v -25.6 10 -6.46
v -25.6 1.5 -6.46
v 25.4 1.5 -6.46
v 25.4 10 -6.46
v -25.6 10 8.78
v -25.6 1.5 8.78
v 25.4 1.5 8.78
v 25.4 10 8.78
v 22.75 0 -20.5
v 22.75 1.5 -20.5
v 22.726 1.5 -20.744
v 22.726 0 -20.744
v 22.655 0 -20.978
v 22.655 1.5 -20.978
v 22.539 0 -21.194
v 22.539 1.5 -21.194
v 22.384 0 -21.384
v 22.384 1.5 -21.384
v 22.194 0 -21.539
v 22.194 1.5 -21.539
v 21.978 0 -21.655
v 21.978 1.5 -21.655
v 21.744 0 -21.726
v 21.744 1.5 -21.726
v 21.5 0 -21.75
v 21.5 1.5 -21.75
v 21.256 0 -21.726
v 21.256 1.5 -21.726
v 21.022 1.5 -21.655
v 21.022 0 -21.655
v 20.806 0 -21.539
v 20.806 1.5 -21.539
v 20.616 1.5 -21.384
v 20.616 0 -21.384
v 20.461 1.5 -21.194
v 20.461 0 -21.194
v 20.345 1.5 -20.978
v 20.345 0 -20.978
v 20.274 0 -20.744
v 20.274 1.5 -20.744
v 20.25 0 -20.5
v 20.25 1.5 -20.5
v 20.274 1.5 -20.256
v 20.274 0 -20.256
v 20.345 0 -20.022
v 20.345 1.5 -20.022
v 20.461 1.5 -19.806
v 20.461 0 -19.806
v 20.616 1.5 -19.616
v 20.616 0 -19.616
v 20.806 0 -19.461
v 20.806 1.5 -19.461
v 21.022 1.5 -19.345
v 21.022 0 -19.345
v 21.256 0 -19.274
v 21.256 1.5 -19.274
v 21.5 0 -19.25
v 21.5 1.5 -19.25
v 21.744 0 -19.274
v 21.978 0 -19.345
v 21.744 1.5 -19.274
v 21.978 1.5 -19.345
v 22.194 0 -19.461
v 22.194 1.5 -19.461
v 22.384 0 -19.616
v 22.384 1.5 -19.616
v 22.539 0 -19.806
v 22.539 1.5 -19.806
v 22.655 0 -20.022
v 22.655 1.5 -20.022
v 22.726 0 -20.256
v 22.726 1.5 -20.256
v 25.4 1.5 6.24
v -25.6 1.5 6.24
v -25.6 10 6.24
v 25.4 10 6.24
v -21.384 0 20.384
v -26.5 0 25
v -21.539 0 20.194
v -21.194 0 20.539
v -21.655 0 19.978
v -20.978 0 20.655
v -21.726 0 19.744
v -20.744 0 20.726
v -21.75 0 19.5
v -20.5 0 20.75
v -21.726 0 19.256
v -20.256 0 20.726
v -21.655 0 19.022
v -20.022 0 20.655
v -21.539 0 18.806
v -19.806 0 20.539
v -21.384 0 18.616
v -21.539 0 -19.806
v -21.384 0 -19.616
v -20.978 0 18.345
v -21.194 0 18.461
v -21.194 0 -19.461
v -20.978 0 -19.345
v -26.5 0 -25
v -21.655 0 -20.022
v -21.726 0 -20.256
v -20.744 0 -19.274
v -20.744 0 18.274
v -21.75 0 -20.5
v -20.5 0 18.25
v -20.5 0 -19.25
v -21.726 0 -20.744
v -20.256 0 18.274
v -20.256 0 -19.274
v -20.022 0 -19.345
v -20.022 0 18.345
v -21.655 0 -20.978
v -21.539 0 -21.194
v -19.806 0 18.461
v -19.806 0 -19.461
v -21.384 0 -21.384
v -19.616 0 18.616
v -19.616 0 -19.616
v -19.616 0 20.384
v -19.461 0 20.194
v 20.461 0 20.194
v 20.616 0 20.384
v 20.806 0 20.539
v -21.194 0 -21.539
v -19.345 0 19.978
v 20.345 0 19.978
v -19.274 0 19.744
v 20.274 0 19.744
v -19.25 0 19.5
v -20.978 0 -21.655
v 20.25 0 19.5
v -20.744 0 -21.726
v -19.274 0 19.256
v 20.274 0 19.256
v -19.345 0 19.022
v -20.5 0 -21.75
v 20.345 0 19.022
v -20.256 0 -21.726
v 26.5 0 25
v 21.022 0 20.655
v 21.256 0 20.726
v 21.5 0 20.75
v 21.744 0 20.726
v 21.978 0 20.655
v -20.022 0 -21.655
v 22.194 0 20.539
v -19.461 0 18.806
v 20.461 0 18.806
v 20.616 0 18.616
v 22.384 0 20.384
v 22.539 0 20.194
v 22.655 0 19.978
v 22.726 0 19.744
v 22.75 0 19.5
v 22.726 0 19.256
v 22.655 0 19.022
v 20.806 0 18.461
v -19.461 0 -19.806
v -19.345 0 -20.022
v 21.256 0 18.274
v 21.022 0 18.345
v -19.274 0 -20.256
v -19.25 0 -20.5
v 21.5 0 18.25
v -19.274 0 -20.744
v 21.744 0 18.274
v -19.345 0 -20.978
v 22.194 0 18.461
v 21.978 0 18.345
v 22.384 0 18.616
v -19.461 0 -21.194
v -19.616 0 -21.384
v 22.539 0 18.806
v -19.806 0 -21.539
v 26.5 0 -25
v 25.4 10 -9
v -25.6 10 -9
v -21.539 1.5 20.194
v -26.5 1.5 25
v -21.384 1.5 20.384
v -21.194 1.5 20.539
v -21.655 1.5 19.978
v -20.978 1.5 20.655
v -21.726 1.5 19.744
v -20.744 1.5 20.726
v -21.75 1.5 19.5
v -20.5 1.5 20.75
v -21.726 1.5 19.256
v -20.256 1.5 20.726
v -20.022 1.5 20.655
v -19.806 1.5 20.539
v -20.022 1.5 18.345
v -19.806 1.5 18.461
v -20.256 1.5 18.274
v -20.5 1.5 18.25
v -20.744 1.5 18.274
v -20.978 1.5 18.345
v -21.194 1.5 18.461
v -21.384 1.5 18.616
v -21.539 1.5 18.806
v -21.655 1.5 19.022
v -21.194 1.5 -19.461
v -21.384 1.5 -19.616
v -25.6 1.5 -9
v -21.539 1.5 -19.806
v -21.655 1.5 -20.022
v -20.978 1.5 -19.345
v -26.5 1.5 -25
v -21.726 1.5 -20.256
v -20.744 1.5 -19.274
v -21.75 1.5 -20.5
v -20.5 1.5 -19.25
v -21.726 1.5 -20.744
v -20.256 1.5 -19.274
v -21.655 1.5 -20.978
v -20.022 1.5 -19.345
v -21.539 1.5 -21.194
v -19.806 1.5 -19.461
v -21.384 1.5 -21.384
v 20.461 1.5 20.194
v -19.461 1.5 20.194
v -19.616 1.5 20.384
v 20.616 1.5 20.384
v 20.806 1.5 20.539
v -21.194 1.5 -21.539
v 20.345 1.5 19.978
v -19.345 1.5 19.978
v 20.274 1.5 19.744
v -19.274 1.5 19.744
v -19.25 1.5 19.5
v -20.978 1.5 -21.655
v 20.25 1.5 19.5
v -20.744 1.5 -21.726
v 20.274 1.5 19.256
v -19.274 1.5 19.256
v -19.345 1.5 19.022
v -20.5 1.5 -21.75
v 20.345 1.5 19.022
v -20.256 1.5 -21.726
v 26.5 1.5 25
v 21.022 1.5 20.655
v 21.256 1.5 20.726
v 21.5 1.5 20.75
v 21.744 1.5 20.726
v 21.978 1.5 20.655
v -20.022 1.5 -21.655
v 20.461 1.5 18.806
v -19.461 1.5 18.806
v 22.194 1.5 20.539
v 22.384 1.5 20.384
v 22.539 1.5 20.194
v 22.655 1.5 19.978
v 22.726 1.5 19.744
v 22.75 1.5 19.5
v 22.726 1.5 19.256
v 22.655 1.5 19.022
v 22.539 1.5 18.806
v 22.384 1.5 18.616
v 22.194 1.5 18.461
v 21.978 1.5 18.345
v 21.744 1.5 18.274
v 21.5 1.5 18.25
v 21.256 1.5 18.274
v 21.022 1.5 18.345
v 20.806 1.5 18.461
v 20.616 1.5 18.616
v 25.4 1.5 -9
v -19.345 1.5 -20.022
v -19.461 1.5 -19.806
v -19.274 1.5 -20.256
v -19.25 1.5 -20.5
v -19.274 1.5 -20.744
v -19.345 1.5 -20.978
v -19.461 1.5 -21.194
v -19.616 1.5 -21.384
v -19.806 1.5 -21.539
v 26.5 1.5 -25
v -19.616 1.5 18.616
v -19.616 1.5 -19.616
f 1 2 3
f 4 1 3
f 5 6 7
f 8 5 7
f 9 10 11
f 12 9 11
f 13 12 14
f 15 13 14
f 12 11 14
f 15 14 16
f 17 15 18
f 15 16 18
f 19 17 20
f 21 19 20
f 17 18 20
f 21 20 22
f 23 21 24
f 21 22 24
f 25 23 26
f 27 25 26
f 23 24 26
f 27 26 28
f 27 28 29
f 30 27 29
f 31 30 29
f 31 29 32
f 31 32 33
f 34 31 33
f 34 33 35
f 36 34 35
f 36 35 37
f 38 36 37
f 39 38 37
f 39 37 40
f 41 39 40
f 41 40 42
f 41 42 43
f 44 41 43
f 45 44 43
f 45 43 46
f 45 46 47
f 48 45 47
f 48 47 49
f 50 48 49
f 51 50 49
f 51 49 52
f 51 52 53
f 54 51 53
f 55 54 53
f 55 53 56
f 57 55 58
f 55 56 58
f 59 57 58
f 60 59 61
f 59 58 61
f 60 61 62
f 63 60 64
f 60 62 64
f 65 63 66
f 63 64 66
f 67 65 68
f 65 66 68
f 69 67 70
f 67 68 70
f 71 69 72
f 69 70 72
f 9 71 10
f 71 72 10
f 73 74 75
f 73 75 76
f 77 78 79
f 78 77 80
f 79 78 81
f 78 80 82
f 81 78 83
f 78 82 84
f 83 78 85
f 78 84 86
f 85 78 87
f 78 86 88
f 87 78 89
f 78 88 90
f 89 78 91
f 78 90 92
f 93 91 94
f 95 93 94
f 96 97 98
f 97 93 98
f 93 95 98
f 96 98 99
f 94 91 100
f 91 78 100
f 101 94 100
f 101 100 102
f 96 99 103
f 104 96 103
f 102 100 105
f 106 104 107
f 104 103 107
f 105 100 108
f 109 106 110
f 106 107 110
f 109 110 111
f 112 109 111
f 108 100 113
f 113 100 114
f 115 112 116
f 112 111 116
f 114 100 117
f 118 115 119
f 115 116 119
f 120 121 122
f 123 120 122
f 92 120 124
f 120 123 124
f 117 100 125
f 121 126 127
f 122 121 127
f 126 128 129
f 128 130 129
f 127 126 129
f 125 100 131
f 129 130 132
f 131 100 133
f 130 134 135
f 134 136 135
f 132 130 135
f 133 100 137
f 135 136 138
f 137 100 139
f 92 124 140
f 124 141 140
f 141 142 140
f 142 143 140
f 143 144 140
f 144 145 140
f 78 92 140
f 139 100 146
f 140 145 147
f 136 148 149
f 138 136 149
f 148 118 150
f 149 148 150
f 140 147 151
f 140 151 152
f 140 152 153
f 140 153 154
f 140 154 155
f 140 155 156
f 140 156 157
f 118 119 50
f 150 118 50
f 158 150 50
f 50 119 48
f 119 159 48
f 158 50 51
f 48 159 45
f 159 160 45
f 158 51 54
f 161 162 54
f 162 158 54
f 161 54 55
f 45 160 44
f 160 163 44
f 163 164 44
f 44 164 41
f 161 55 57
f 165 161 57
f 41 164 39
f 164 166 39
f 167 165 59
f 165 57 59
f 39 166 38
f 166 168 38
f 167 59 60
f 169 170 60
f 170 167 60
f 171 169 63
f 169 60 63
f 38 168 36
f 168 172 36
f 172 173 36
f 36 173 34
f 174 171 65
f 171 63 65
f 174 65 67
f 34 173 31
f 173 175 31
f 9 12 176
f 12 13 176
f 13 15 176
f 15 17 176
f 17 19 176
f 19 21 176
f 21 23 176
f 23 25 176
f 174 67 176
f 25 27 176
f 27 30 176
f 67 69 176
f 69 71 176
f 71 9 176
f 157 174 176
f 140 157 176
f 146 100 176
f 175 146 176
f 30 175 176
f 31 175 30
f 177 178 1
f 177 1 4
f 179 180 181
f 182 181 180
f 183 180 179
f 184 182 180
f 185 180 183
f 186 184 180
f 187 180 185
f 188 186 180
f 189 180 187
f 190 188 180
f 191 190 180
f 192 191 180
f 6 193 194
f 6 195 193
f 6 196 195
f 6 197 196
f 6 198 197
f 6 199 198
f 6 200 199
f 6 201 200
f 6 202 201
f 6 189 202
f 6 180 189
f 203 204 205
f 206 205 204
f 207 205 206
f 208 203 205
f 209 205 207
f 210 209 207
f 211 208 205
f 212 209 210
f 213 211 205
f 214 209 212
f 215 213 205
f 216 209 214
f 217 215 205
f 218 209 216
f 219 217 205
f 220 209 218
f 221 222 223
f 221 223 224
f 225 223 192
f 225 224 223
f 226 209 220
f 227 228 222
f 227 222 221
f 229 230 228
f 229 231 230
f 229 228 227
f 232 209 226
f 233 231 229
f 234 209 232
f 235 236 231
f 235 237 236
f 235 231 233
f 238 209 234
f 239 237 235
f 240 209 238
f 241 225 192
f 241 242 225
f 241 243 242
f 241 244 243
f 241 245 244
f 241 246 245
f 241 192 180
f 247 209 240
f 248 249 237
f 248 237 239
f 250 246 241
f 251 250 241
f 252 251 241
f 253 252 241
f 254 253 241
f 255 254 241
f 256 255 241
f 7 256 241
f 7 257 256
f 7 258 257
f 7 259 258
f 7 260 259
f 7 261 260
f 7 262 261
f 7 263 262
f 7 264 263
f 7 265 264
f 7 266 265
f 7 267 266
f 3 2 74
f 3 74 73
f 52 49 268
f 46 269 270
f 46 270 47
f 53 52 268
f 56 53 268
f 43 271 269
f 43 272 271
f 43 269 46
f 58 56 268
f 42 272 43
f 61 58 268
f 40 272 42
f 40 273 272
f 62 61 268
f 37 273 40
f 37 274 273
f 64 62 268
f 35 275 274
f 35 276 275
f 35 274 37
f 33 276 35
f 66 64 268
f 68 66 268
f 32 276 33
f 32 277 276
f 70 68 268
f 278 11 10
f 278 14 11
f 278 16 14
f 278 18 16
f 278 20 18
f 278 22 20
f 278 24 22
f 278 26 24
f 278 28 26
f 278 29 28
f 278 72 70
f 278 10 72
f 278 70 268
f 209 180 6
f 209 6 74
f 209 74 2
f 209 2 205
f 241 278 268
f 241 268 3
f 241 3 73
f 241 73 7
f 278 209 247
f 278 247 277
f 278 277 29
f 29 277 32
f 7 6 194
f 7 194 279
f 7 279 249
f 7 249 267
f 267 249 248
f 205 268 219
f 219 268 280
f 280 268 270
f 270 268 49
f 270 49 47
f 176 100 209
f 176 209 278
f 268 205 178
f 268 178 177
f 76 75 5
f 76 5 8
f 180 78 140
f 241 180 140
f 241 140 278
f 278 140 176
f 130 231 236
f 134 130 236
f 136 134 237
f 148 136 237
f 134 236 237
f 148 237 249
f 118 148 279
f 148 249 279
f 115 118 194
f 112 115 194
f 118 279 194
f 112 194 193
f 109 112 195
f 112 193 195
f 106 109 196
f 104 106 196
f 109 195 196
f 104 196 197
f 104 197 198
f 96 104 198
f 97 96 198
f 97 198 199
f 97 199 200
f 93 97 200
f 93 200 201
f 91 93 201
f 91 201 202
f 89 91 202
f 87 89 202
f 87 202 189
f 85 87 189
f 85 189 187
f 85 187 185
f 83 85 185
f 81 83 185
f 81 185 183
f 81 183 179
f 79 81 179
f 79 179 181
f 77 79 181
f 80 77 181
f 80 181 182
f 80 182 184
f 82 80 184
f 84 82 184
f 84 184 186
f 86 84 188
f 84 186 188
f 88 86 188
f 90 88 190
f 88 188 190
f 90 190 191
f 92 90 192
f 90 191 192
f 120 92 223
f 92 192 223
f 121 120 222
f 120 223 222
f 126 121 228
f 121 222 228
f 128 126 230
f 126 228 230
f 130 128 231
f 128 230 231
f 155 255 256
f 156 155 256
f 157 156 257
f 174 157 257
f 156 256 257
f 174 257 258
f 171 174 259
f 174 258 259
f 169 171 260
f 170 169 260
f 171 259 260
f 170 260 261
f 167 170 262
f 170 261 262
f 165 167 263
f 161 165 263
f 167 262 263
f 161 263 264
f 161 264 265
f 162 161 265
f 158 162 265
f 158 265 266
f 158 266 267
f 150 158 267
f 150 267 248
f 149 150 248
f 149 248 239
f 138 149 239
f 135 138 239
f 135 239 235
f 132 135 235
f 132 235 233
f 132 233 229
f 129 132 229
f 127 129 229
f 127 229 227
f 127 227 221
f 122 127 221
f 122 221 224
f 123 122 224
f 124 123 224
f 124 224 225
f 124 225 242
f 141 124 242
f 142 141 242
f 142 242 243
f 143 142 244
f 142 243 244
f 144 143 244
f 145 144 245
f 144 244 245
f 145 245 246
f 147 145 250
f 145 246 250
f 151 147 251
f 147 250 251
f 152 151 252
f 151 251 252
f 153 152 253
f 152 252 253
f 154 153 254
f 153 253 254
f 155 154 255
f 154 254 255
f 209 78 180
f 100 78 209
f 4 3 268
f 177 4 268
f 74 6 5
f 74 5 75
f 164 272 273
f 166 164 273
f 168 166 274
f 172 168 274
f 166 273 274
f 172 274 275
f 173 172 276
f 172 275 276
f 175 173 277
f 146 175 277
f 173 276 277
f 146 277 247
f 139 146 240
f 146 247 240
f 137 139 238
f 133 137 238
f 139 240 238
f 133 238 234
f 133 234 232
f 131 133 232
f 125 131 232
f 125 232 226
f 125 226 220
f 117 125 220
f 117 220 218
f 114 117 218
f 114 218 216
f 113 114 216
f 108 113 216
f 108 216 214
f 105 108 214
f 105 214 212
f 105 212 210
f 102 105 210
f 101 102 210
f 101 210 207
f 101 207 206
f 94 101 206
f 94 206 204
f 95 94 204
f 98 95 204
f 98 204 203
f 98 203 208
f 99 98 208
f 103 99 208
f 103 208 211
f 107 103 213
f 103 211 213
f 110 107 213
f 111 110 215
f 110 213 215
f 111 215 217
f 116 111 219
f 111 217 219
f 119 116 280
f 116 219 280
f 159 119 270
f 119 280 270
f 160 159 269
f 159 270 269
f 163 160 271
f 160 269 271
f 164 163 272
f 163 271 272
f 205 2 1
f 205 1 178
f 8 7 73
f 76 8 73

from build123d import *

# Parameters (mm, degrees)
SCHIZZO1_W                   = 53
SCHIZZO1_H                   = 50
ESTRUSIONE_ESTRUSIONE1_DEPTH = 1.5
SCHIZZO2_W                   = 51
SCHIZZO2_H                   = 2.54
ESTRUSIONE_ESTRUSIONE2_DEPTH = 8.5
SCHIZZO3_R                   = 1.25
TAGLIO_ESTRUSIONE1_DEPTH     = 8.5


with BuildPart() as part:
    # Schizzo1 → Estrusione-Estrusione1 (new body)
    with BuildSketch(Plane(origin=(0, 0, 0), x_dir=(1, 0, 0), z_dir=(0, 1, 0))):
        Rectangle(SCHIZZO1_W, SCHIZZO1_H)
    extrude(amount=ESTRUSIONE_ESTRUSIONE1_DEPTH)

    # Schizzo2 → Estrusione-Estrusione2 (add)
    with BuildSketch(Plane(origin=(0, 1.5, 0), x_dir=(1, 0, 0), z_dir=(0, 1, 0))):
        with Locations((-0.1, 7.73)):
            Rectangle(SCHIZZO2_W, SCHIZZO2_H)
        with Locations((-0.1, -7.51)):
            Rectangle(SCHIZZO2_W, SCHIZZO2_H)
    extrude(amount=ESTRUSIONE_ESTRUSIONE2_DEPTH)

    # Schizzo3 → Taglio-Estrusione1 (cut)
    with BuildSketch(Plane(origin=(0, 1.5, 0), x_dir=(1, 0, 0), z_dir=(0, 1, 0))):
        with Locations((21.5, 20.5)):
            Circle(SCHIZZO3_R)
        with Locations((-20.5, 20.5)):
            Circle(SCHIZZO3_R)
        with Locations((21.5, -19.5)):
            Circle(SCHIZZO3_R)
        with Locations((-20.5, -19.5)):
            Circle(SCHIZZO3_R)
    extrude(amount=-TAGLIO_ESTRUSIONE1_DEPTH, mode=Mode.SUBTRACT)


solid = part.part
